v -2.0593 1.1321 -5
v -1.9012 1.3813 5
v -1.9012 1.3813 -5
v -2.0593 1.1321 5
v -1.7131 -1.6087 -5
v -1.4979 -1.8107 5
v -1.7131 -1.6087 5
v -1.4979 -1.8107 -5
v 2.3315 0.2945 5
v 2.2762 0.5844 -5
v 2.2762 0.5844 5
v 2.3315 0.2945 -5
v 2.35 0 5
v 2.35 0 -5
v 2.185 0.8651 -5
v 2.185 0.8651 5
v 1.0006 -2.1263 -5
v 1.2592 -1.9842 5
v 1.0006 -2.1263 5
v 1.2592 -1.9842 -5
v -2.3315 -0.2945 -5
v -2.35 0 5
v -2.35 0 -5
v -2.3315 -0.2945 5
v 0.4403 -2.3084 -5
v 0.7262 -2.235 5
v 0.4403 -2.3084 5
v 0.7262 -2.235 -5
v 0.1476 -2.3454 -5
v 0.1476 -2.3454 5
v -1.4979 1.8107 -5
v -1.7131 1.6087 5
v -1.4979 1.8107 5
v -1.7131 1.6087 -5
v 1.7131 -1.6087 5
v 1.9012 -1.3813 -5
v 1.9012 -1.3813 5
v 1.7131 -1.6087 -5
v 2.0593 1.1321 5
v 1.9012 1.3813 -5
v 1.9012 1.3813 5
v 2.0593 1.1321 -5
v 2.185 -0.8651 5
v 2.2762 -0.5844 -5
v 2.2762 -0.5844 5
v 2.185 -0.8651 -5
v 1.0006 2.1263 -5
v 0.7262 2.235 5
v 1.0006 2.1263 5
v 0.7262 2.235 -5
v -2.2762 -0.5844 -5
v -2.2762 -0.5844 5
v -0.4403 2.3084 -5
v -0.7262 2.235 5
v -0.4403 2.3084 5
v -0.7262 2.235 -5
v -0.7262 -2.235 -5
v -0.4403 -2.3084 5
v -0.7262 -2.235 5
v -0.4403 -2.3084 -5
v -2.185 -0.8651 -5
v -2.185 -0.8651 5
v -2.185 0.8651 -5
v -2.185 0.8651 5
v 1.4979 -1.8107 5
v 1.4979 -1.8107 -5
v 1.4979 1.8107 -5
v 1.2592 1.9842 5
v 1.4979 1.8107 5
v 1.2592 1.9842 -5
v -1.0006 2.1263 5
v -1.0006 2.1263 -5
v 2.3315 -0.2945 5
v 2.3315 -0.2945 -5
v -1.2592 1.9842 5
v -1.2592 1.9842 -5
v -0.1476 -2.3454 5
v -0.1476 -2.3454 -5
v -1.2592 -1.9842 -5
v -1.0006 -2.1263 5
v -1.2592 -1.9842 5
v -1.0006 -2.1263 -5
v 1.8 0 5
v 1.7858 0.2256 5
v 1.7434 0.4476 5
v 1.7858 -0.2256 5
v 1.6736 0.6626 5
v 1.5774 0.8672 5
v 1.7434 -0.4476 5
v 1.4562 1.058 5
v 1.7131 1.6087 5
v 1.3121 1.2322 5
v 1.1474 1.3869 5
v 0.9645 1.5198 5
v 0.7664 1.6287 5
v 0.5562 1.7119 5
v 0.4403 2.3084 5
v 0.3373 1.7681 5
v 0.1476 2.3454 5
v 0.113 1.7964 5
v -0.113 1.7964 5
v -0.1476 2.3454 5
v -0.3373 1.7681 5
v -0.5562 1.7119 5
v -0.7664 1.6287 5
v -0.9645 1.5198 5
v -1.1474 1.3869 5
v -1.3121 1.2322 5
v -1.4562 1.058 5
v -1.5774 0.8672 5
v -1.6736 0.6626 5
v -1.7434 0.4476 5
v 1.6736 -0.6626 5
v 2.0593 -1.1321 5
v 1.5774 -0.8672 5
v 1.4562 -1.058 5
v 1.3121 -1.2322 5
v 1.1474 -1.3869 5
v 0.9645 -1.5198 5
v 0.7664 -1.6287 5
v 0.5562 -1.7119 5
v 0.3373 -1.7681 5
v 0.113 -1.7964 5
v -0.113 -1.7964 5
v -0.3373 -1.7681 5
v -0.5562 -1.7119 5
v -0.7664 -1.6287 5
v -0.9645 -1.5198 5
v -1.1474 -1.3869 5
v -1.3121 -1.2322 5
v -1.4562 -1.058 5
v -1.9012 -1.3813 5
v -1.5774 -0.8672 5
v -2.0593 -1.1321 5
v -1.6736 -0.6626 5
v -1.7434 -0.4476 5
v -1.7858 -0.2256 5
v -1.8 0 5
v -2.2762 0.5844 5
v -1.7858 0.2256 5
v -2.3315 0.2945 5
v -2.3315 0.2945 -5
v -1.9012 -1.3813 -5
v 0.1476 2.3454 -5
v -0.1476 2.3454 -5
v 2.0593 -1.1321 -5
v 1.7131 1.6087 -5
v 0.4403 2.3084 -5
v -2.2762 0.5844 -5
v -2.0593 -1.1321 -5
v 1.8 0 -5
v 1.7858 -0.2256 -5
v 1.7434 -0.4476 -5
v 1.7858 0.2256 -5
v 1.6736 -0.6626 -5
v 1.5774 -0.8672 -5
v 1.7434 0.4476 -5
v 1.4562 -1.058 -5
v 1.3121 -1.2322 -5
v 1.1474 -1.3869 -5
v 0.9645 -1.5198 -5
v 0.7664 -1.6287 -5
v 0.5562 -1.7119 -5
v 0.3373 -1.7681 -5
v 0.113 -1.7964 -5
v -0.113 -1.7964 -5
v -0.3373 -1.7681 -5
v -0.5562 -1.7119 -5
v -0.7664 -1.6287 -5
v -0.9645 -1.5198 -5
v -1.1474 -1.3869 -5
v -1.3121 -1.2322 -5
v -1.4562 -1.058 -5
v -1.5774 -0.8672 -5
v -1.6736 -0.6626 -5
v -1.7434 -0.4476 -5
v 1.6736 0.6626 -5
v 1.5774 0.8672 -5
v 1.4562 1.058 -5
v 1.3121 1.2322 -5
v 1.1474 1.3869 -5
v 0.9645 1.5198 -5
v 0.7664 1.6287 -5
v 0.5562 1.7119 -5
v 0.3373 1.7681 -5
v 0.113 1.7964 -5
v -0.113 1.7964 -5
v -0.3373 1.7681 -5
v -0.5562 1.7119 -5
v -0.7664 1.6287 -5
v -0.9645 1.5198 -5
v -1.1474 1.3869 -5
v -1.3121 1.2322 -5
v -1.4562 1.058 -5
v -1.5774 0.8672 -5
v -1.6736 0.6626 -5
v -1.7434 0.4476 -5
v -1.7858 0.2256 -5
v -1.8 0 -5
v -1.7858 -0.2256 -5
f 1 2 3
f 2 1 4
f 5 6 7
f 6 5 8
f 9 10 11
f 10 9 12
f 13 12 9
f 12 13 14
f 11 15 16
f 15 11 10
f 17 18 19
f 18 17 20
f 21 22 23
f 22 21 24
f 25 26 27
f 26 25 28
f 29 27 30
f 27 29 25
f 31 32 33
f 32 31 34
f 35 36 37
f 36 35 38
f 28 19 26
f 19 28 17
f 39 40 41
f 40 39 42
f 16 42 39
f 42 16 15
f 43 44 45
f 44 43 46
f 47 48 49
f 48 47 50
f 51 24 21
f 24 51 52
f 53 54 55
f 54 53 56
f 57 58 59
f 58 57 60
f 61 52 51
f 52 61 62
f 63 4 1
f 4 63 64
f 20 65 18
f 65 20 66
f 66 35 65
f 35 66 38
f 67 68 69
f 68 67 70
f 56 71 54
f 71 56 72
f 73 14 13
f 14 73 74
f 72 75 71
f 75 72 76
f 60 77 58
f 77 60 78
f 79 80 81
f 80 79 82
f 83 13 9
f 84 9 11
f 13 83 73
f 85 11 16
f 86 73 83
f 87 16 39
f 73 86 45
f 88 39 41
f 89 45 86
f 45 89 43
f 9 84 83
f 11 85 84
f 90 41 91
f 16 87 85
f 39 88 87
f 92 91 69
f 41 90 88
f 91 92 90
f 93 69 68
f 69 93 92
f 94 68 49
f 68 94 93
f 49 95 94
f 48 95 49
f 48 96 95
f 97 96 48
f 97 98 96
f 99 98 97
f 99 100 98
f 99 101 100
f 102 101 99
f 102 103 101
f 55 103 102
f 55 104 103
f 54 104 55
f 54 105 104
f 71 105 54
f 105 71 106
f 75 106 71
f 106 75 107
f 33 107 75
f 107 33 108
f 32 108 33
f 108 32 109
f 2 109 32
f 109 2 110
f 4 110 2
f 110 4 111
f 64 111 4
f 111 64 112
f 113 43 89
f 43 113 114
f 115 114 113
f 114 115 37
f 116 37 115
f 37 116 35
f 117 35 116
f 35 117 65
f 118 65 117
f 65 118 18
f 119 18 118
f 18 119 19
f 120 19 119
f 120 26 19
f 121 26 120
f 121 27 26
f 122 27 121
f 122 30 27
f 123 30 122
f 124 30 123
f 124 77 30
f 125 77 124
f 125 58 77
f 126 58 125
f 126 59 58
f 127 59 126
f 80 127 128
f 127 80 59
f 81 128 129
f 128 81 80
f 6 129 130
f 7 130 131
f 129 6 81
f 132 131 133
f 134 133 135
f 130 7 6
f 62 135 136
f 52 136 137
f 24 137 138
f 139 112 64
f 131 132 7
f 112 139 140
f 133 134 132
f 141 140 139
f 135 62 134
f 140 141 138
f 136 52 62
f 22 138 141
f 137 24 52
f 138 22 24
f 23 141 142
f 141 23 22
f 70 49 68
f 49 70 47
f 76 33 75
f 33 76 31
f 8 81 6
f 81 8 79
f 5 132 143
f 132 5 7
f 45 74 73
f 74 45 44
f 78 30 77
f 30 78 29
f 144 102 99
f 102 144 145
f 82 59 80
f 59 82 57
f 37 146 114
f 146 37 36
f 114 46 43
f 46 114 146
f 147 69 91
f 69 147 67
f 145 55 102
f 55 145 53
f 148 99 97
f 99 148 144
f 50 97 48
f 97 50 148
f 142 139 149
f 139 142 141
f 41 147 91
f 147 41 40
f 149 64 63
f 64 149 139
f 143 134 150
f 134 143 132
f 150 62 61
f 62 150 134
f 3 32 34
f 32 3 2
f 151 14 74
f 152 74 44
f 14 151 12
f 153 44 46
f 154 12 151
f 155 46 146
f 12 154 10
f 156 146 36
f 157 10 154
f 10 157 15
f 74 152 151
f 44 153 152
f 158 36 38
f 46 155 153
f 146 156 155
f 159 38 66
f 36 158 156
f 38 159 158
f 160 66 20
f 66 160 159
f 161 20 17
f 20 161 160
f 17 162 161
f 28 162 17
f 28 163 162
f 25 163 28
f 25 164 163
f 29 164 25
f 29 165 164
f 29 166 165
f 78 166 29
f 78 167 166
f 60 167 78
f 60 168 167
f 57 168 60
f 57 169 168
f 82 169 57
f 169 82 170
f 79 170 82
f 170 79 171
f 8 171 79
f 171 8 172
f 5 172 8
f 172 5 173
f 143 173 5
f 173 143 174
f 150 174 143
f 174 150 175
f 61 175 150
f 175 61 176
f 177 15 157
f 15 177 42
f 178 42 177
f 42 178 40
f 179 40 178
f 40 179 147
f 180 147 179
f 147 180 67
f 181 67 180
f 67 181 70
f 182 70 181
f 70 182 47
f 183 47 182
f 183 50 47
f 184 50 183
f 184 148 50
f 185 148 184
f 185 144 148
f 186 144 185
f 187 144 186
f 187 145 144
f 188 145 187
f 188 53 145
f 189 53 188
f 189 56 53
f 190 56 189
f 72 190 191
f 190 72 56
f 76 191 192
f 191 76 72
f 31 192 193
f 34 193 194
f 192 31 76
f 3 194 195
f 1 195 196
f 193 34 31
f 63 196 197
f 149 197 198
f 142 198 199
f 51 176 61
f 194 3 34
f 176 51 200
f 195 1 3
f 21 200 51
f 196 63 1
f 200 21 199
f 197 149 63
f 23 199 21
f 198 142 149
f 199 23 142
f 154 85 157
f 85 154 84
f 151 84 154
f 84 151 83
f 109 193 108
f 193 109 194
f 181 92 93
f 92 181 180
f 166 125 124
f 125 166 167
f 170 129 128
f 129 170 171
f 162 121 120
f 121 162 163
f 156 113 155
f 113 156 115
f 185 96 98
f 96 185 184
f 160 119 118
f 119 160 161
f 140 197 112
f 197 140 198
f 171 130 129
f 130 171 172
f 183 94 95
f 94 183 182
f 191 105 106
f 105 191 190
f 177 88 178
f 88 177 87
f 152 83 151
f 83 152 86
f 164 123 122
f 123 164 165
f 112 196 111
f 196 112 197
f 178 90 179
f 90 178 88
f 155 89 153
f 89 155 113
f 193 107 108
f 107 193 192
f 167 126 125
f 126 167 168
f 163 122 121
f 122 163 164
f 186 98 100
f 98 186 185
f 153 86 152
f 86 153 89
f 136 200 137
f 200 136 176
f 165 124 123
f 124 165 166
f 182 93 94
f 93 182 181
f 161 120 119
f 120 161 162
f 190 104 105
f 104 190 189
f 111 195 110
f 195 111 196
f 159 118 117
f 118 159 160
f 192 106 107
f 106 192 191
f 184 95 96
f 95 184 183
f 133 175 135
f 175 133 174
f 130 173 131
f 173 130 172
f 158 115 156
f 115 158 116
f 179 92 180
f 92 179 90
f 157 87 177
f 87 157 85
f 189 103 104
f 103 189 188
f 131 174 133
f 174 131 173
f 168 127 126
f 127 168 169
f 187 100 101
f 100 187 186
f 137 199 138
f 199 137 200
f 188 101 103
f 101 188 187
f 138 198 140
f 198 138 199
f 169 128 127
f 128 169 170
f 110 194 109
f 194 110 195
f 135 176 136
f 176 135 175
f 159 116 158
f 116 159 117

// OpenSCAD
$fn = 50;


difference() {
	union() {
		translate(v = [0, 0, -5.0000000000]) {
			cylinder(h = 10, r = 2.3500000000);
		}
	}
	union() {
		#translate(v = [0, 0, -100.0000000000]) {
			cylinder(h = 200, r = 1.8000000000);
		}
	}
}
